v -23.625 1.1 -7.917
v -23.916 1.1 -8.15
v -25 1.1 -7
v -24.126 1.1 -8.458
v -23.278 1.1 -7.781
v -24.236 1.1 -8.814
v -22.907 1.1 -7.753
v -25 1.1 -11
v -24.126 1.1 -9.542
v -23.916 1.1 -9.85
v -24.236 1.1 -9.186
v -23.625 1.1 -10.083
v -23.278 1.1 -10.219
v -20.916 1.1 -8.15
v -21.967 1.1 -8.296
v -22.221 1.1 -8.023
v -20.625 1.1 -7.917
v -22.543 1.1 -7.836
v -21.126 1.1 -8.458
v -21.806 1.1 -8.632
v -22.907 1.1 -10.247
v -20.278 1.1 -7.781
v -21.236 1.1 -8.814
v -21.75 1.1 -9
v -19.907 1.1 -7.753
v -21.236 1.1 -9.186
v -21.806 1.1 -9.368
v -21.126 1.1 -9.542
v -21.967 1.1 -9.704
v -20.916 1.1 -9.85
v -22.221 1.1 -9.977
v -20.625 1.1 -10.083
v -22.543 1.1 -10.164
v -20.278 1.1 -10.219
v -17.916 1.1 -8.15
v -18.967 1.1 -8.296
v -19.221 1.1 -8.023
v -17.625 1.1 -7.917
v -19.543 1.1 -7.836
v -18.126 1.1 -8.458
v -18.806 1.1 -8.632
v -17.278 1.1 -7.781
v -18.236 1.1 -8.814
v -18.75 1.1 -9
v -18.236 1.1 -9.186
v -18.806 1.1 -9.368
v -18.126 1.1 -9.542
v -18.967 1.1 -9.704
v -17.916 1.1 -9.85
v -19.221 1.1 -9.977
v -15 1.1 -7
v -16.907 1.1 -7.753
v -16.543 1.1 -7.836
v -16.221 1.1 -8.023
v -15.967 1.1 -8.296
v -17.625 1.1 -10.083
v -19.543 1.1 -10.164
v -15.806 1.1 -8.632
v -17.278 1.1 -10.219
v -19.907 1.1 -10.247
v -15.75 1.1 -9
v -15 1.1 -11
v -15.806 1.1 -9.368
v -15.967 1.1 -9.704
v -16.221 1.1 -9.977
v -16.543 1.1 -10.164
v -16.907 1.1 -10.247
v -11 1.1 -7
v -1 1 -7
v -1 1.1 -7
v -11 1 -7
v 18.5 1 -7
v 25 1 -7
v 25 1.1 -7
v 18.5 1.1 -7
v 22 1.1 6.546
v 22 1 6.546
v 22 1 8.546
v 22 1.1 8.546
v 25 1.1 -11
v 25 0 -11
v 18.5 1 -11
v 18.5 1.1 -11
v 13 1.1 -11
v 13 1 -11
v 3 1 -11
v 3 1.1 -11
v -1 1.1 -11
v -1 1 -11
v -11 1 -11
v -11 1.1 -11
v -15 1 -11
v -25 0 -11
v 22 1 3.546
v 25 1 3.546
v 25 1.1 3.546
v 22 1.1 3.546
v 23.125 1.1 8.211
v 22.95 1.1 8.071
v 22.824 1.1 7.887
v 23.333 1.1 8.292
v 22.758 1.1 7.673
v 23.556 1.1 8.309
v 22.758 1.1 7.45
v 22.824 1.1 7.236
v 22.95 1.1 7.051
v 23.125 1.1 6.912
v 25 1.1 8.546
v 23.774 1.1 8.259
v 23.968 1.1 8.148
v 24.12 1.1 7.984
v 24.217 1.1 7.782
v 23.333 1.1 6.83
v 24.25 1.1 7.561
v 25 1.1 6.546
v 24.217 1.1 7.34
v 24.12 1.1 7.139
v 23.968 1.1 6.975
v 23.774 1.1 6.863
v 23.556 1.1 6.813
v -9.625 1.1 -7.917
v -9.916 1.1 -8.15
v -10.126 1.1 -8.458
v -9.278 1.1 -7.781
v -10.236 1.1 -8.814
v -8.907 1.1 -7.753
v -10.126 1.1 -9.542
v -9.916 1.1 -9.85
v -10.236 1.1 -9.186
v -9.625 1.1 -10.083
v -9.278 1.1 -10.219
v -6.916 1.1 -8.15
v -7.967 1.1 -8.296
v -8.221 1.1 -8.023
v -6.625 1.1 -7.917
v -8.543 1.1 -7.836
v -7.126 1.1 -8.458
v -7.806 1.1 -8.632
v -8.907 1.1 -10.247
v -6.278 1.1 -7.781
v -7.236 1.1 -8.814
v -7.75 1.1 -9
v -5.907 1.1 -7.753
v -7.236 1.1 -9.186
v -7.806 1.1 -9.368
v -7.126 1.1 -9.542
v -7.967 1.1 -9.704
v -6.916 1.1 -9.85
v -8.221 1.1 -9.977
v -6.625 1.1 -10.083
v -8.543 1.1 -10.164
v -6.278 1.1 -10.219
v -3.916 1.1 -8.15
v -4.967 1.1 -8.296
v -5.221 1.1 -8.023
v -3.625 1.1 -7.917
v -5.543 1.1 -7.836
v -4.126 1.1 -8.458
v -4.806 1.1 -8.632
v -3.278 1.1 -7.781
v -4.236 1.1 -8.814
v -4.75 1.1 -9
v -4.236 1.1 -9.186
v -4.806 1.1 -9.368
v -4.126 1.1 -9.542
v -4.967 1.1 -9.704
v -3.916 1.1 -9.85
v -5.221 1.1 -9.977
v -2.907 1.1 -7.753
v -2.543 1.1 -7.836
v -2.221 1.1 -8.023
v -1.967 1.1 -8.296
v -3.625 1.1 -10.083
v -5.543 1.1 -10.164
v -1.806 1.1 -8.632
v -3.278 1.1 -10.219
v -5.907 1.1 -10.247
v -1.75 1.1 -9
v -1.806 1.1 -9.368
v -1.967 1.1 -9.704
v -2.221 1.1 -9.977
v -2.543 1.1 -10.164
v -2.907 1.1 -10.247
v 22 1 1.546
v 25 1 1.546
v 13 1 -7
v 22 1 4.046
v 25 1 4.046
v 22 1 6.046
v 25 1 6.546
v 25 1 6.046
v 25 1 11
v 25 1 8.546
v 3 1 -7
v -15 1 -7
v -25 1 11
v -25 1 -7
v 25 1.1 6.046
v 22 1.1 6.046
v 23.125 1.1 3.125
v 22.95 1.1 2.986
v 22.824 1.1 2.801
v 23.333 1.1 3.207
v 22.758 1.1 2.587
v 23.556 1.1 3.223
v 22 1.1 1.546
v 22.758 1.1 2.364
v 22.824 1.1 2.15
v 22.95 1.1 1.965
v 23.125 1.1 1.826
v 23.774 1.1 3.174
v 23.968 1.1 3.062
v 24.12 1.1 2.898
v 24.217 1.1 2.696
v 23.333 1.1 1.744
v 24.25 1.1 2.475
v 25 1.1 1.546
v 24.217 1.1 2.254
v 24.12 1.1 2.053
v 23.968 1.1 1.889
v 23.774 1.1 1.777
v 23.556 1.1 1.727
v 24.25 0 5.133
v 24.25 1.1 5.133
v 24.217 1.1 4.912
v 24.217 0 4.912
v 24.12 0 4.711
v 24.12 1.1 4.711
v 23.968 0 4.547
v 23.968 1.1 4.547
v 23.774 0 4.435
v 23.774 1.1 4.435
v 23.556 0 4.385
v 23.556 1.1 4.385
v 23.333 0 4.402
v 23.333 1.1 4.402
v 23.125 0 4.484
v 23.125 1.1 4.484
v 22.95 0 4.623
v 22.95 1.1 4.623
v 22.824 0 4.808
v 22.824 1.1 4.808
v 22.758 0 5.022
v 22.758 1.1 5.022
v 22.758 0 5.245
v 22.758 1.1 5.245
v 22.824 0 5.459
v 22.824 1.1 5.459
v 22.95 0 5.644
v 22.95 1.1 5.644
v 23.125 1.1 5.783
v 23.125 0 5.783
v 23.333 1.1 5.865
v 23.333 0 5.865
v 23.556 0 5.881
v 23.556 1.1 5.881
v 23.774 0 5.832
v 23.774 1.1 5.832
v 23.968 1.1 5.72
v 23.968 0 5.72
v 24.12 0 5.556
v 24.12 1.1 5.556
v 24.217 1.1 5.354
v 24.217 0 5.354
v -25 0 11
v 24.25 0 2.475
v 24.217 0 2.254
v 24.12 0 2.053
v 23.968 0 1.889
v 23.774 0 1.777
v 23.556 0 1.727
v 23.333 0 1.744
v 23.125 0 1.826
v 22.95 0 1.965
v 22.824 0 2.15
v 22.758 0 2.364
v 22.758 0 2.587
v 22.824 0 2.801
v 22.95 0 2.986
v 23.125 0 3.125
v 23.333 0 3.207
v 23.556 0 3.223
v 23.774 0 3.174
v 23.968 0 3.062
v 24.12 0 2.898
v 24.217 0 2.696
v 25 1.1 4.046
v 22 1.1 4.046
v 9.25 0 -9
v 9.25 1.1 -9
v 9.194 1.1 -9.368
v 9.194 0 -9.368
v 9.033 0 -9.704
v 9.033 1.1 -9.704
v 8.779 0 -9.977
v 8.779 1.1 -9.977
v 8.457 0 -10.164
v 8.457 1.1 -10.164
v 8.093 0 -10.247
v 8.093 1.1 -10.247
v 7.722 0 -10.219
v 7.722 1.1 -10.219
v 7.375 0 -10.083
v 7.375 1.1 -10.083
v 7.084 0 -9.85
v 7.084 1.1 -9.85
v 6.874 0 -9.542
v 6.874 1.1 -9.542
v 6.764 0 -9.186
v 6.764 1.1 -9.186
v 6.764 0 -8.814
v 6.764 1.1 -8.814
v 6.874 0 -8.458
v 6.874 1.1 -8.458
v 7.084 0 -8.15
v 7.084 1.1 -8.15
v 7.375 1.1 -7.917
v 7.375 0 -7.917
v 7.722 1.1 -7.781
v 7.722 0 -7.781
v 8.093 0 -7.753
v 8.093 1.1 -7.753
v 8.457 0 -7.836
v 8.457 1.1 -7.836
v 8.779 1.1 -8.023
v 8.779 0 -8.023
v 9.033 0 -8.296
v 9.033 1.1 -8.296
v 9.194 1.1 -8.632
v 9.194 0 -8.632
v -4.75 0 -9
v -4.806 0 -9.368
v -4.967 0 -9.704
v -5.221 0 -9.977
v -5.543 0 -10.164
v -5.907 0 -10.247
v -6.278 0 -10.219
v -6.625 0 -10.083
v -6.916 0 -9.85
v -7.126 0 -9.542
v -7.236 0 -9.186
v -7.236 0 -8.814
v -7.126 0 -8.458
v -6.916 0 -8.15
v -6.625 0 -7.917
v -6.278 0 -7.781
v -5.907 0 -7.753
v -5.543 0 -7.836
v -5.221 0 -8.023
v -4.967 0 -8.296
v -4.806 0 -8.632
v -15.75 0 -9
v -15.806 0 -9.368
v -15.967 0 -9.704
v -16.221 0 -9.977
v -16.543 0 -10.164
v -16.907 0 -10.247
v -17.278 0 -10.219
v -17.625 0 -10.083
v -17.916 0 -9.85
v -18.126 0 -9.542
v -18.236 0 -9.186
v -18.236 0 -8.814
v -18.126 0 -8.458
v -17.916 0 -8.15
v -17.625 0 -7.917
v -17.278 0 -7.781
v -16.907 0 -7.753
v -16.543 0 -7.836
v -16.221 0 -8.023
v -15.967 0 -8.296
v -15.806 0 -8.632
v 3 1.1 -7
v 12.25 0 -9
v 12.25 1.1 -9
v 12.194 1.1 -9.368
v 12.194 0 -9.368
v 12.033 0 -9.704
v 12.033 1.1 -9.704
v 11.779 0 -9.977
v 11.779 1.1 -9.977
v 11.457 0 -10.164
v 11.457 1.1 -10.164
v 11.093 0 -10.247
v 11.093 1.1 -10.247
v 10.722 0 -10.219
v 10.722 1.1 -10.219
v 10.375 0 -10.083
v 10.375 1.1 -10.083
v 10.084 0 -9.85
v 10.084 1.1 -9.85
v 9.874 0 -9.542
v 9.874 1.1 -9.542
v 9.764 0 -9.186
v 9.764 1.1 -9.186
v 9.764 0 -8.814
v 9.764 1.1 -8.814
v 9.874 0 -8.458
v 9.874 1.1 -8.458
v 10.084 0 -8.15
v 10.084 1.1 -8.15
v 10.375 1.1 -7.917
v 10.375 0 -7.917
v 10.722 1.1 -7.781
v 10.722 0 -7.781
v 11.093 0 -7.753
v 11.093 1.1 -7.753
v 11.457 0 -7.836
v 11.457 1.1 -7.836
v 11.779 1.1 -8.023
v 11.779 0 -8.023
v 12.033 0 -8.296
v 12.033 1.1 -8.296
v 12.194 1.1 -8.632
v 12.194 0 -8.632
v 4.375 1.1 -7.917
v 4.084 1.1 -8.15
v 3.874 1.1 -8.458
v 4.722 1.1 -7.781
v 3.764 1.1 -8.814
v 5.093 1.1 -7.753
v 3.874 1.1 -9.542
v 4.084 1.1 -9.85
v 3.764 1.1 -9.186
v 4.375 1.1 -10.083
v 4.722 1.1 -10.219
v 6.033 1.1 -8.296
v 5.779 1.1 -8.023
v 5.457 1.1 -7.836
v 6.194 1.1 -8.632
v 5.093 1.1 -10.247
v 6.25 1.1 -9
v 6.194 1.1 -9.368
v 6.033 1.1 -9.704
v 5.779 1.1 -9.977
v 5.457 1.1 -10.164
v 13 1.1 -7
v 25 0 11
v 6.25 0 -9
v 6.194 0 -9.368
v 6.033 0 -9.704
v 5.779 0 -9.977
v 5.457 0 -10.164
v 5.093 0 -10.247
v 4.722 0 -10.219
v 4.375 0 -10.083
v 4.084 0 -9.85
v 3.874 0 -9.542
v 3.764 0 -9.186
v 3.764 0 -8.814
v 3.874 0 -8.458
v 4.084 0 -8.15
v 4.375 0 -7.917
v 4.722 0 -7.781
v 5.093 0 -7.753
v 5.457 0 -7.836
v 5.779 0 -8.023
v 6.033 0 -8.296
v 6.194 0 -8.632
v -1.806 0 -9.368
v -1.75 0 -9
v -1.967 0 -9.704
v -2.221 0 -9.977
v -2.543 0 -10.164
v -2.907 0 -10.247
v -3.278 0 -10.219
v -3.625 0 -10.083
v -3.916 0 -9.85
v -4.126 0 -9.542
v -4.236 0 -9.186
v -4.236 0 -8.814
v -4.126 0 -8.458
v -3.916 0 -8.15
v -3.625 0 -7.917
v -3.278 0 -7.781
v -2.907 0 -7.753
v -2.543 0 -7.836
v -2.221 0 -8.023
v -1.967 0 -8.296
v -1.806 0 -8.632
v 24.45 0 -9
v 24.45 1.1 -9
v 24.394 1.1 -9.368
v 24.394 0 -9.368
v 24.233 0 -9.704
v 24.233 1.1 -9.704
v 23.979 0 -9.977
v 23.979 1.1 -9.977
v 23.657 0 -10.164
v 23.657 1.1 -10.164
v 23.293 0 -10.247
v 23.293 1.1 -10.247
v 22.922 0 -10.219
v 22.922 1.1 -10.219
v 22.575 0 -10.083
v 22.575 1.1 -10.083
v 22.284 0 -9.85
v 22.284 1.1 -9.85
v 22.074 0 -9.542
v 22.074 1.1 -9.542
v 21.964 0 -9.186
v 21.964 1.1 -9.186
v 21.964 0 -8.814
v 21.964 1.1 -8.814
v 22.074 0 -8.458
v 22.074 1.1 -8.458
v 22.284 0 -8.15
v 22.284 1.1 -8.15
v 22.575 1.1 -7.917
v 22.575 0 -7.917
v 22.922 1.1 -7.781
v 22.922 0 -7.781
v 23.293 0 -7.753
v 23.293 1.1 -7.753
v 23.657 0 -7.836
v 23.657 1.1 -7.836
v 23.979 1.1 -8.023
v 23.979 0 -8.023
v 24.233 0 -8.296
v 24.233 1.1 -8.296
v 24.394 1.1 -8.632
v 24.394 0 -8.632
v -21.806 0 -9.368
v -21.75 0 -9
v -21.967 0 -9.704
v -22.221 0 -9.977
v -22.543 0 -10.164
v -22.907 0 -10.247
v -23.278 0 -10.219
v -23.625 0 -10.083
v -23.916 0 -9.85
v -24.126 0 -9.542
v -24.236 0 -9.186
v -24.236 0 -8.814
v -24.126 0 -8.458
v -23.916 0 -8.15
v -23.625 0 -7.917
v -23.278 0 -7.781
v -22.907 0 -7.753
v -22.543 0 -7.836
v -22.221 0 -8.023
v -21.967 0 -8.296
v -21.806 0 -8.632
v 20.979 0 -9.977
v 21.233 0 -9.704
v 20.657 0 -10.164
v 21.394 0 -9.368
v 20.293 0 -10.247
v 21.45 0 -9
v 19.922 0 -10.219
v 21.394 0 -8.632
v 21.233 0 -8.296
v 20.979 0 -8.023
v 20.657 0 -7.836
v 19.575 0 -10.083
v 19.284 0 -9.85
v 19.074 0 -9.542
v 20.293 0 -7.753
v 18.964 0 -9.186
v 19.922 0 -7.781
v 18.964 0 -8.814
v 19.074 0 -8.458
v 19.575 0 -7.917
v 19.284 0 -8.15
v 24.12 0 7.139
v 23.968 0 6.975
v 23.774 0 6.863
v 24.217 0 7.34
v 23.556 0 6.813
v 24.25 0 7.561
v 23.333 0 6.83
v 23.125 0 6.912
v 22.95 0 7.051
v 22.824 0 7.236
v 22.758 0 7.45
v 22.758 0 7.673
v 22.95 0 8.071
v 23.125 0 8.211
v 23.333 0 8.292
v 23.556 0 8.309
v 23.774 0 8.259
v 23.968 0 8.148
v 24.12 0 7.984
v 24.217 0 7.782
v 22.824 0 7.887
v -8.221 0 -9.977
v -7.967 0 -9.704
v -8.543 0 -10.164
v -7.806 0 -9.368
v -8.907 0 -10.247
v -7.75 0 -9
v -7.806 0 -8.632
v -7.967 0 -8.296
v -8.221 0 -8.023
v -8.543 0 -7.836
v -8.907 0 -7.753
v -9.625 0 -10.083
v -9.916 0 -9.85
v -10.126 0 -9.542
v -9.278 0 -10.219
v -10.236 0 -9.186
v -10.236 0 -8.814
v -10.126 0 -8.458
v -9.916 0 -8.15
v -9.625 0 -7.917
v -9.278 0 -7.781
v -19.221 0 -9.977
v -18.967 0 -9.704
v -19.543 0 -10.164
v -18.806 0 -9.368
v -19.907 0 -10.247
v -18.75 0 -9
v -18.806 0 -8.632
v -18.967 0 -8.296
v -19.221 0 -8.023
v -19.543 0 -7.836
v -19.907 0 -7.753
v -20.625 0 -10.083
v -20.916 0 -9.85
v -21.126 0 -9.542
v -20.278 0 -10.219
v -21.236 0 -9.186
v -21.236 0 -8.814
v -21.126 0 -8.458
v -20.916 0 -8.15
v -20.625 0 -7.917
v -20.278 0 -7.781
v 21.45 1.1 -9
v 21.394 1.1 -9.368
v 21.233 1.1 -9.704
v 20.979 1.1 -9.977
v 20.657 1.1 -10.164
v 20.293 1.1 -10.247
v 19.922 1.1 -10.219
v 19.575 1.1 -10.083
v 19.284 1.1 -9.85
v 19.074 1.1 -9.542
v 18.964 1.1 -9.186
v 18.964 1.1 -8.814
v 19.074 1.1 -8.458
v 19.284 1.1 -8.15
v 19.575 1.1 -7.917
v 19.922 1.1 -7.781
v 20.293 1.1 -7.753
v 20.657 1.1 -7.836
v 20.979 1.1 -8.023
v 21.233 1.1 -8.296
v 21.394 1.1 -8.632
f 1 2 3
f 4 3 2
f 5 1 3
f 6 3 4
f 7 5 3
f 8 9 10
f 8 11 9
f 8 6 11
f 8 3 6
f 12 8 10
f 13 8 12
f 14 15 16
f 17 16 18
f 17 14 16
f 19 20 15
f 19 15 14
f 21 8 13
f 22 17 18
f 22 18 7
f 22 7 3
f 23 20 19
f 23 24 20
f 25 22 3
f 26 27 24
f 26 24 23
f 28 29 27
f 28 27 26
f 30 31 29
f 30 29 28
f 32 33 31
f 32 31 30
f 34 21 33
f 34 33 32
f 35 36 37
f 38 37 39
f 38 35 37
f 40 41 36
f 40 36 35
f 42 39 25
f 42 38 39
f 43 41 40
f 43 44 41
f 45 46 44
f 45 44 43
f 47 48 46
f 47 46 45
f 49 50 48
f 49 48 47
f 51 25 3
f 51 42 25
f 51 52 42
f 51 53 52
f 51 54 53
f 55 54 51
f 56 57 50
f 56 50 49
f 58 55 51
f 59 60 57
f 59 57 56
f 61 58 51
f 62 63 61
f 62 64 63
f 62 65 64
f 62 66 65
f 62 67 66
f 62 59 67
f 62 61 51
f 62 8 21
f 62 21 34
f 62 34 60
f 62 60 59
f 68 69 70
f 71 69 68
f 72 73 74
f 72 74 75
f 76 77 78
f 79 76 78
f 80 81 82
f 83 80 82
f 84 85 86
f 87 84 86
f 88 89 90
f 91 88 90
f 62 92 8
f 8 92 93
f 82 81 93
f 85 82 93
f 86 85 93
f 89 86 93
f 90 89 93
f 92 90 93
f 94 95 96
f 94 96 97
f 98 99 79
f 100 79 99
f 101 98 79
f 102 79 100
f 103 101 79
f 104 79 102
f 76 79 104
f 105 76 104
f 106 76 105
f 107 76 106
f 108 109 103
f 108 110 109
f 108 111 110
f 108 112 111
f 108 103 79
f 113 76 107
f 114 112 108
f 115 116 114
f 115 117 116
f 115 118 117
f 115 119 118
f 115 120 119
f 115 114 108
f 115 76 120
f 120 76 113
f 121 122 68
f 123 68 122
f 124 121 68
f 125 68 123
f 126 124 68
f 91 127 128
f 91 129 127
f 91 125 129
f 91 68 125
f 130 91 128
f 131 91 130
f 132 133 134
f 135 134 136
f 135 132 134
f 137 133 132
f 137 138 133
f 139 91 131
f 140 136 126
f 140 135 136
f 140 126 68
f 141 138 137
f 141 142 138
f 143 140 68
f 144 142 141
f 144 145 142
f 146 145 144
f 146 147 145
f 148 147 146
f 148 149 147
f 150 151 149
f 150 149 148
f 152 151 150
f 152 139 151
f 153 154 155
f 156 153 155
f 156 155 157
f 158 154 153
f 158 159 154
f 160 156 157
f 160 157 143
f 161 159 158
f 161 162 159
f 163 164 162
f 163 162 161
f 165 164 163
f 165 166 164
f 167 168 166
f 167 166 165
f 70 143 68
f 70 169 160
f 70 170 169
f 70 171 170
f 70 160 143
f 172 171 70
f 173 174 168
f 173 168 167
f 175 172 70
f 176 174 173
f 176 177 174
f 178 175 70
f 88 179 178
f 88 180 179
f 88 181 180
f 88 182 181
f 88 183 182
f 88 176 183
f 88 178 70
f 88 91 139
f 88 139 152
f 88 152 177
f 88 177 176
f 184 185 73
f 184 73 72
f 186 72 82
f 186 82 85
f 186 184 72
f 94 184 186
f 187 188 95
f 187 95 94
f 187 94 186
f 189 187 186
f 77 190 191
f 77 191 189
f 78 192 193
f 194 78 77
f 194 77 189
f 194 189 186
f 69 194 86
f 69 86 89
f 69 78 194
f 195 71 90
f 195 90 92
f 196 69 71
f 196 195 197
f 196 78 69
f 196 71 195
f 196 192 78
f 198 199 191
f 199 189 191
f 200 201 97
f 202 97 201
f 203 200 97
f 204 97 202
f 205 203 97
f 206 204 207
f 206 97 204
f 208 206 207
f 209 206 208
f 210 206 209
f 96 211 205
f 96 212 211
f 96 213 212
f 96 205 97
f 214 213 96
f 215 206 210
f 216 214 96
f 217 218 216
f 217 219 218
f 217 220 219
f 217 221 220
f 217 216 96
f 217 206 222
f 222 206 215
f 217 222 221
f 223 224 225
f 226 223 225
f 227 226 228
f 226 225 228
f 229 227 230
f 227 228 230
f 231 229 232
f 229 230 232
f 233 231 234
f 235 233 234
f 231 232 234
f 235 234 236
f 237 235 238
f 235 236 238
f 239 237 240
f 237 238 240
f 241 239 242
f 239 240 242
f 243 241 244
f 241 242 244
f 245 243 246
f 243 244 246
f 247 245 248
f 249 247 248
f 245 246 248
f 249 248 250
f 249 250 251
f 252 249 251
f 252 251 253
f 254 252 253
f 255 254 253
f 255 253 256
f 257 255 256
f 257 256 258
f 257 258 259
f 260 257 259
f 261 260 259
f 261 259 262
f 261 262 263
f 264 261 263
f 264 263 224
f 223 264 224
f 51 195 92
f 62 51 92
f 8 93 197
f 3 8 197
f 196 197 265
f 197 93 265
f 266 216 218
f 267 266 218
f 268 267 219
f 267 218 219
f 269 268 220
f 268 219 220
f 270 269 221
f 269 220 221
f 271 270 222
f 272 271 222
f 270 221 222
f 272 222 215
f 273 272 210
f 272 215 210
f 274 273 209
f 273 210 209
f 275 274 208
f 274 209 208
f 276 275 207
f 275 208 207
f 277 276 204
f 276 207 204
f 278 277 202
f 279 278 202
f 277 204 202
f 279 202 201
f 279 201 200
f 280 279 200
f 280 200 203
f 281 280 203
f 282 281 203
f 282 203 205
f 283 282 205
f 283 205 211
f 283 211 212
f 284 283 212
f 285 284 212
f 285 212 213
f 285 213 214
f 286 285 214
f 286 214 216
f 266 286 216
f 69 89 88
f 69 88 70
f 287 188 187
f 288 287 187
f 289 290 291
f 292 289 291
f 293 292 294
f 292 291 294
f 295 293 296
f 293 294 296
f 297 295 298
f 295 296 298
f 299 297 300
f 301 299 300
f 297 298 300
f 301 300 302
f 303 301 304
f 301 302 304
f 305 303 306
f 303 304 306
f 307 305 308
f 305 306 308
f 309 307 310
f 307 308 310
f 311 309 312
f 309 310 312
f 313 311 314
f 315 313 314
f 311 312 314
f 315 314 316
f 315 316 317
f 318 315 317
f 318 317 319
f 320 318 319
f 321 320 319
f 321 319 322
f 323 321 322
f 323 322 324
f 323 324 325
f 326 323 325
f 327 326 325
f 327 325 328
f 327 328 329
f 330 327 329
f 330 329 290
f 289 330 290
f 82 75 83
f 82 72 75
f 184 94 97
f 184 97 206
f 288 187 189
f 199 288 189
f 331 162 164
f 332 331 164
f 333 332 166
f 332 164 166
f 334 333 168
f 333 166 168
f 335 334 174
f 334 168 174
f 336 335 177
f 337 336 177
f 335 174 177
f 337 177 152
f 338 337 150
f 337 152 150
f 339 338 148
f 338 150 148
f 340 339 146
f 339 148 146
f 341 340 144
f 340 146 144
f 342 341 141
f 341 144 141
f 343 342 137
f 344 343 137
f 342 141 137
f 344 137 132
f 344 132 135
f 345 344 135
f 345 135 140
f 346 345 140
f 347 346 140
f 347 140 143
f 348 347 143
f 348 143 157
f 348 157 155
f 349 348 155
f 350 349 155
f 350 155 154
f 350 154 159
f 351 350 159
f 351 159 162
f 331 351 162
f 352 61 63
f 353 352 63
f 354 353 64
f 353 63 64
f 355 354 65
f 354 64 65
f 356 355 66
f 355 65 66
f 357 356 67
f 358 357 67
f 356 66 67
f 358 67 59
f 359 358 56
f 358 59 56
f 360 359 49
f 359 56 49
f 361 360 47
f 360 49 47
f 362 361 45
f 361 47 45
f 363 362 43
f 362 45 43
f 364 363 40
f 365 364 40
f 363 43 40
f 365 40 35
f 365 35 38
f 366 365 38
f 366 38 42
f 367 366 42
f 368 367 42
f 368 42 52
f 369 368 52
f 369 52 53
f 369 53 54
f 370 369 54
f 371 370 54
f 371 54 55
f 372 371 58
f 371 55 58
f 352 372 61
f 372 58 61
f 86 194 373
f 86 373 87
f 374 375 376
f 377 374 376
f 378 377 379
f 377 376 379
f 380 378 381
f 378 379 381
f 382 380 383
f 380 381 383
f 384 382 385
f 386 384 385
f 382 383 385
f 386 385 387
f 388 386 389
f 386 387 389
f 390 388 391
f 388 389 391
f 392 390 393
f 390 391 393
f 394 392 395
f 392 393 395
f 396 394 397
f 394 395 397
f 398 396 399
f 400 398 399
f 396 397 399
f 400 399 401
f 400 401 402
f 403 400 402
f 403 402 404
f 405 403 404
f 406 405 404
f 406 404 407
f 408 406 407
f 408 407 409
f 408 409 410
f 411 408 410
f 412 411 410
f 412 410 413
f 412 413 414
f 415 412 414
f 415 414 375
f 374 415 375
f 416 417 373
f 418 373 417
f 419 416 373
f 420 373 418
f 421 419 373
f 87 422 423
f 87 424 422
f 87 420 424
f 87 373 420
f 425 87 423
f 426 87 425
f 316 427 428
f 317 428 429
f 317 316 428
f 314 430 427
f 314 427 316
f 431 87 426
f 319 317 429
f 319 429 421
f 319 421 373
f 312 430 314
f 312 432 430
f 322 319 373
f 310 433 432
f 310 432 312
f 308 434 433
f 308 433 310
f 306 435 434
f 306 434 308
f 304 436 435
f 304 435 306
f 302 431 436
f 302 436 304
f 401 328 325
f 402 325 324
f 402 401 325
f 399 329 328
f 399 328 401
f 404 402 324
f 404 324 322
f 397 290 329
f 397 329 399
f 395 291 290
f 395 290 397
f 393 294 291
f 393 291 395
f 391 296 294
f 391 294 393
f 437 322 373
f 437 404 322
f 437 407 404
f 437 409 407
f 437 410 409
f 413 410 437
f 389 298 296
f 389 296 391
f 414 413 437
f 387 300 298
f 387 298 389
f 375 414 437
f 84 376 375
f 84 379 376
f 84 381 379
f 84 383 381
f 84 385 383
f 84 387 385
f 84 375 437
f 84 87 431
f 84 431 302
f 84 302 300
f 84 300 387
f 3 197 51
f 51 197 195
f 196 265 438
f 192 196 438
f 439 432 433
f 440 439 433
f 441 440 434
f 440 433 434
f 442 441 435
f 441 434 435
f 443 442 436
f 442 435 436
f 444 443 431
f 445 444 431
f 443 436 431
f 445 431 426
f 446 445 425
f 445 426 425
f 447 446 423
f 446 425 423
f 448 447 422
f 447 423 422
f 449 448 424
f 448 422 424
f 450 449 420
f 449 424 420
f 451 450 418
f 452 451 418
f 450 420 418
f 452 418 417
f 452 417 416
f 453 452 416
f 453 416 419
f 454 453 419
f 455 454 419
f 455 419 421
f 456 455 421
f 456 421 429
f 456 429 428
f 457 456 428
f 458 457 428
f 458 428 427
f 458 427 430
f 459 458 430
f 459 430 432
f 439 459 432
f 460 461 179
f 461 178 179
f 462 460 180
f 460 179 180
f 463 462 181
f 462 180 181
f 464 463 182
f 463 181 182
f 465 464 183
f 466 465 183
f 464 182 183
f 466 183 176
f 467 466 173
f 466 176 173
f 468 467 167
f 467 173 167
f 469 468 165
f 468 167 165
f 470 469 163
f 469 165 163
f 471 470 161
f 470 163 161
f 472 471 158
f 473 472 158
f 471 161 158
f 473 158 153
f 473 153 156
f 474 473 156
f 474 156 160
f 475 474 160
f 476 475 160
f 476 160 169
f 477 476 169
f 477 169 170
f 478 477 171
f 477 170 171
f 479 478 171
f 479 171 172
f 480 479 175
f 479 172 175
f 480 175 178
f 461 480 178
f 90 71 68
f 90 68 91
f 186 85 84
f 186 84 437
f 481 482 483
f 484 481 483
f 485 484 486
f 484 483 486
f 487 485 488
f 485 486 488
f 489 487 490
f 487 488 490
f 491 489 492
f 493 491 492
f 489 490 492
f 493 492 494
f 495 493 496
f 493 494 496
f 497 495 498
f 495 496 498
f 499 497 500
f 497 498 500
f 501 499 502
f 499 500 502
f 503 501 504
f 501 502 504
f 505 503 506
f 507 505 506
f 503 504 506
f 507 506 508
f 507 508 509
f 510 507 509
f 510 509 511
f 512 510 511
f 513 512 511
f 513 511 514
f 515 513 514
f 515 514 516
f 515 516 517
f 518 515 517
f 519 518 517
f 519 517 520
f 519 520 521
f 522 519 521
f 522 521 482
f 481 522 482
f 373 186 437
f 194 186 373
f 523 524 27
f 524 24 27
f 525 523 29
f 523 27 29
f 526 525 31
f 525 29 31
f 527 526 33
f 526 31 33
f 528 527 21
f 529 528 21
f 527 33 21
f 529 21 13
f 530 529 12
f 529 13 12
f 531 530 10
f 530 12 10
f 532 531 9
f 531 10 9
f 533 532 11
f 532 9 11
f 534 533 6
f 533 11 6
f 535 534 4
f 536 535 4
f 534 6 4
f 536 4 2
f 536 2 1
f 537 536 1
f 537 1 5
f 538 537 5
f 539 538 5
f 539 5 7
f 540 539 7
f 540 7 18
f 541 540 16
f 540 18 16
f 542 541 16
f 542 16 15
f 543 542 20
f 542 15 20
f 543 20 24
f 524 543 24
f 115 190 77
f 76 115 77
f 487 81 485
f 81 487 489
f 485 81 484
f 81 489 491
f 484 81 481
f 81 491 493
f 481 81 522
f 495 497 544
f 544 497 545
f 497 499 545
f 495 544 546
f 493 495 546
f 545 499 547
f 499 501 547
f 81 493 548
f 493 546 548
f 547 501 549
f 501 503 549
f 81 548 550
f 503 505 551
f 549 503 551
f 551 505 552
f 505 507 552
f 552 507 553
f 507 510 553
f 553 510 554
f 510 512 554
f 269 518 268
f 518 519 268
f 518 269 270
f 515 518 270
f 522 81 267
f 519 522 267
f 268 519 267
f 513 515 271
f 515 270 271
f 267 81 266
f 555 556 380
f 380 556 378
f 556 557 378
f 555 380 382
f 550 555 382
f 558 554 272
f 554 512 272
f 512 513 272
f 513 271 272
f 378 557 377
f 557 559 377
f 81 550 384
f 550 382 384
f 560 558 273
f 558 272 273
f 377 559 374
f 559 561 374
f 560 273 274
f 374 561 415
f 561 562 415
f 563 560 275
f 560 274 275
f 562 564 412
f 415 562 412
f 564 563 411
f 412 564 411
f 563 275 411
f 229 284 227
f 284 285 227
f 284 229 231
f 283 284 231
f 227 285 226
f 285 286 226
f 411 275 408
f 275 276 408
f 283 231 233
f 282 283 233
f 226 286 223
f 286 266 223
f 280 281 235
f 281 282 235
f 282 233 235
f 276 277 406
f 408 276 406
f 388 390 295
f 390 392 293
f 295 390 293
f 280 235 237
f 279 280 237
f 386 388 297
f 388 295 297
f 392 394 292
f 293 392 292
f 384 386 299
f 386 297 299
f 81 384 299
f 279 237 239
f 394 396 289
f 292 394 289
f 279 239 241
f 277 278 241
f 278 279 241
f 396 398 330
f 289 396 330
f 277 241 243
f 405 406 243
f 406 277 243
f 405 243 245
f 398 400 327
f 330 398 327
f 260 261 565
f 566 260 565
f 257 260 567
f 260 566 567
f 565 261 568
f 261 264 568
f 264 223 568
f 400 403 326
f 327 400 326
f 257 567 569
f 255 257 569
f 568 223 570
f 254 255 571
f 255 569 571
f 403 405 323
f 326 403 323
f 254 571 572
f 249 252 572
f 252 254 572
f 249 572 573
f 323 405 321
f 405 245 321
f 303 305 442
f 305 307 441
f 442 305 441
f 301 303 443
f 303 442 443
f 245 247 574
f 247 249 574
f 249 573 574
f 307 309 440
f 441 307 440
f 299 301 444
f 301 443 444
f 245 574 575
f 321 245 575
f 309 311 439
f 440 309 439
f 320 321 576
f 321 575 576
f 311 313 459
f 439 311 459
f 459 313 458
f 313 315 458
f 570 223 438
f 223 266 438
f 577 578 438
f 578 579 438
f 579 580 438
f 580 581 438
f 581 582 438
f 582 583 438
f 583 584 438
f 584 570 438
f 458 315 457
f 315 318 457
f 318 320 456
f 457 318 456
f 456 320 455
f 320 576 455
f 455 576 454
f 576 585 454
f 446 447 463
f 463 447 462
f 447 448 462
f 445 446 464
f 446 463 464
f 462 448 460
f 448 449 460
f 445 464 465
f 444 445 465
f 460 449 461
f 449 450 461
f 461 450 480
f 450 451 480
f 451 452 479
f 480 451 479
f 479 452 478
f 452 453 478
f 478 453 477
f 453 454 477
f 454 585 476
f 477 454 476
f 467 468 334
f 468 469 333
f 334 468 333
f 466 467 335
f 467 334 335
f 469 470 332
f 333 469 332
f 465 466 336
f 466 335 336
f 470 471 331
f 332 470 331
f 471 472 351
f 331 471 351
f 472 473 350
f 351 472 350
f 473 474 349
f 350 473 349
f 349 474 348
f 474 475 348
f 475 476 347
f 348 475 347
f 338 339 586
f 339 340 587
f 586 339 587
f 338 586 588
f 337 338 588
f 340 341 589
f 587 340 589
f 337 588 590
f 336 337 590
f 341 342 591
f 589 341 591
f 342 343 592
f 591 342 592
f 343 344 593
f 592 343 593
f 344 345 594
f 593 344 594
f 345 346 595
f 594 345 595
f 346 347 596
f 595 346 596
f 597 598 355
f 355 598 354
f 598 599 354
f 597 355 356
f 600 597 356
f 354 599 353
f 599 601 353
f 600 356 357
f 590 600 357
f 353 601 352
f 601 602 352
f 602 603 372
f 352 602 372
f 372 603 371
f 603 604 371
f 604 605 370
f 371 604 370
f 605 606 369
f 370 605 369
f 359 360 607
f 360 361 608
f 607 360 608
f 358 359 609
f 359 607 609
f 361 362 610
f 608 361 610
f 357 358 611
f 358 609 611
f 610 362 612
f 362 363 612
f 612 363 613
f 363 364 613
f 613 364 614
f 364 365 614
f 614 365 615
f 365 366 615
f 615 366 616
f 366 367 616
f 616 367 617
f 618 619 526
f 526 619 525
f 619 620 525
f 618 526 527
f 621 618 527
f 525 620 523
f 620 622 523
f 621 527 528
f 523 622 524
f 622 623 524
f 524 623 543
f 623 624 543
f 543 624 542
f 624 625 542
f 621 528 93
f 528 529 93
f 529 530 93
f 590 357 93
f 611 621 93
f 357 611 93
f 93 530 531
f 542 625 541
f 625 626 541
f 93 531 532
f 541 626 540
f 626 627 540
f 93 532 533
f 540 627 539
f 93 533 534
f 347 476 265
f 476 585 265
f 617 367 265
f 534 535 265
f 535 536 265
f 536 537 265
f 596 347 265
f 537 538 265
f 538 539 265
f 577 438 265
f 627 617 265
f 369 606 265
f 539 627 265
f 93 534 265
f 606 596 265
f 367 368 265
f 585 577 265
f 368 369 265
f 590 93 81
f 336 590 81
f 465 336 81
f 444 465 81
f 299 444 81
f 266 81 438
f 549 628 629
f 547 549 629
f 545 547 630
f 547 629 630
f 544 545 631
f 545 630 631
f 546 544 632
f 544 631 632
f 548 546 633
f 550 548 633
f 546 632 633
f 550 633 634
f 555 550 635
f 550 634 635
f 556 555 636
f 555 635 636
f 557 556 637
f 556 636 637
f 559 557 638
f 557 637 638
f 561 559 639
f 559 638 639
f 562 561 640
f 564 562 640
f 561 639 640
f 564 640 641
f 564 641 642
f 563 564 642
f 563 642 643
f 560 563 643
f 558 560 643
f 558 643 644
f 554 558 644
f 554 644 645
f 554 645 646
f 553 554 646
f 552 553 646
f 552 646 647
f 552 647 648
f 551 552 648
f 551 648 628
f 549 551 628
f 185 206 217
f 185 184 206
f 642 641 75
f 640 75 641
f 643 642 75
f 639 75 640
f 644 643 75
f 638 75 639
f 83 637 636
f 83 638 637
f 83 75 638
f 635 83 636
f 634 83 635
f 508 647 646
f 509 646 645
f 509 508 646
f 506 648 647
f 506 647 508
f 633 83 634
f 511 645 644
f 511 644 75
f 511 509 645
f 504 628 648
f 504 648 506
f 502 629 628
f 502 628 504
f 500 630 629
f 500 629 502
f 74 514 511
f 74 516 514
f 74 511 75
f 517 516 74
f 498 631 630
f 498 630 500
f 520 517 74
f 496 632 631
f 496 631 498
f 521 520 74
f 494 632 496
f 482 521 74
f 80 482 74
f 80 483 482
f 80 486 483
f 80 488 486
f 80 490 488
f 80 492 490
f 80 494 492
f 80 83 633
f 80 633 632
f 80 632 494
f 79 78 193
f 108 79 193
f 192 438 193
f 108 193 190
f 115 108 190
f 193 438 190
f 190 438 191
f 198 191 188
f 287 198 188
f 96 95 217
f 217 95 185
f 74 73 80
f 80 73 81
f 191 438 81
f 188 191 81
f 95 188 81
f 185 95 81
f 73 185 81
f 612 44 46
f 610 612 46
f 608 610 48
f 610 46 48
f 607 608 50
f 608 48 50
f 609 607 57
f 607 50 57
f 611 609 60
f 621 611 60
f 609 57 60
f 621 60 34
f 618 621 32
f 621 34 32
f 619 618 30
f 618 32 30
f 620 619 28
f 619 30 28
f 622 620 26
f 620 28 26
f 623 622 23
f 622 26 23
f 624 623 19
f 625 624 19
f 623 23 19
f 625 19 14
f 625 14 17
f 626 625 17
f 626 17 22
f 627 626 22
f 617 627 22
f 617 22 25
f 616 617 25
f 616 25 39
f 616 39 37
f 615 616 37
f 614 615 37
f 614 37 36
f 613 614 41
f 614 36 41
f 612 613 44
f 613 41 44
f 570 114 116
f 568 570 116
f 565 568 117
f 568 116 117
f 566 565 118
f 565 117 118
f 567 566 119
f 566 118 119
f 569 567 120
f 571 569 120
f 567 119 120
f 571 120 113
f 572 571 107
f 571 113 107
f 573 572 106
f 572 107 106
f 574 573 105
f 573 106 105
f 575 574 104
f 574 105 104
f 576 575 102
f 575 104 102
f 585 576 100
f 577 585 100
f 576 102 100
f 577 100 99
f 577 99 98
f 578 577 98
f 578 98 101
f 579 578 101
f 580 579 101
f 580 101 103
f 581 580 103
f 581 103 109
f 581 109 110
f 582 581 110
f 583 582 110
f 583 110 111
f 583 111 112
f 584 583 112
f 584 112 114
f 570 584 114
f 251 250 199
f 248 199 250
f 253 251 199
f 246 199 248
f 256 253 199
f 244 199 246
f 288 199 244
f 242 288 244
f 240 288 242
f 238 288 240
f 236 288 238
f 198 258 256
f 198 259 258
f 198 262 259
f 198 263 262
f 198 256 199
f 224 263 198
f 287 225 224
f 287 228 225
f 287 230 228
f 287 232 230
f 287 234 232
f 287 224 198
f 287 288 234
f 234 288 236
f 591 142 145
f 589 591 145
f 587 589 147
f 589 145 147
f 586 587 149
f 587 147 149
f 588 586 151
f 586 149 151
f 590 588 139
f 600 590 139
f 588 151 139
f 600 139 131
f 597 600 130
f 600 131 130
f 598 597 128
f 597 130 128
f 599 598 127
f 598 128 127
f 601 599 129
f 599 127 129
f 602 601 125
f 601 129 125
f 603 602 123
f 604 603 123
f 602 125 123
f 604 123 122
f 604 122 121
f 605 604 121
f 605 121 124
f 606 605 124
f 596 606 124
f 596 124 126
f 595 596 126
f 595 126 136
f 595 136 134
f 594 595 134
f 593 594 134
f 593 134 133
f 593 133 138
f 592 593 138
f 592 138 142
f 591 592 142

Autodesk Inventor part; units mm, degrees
ref_plane "YZ Plane" through (0, 0, 0) normal (1, 0, 0) x (0, 1, 0)
ref_plane "XZ Plane" through (0, 0, 0) normal (0, 1, 0) x (-1, 0, 0)
ref_plane "XY Plane" through (0, 0, 0) normal (0, 0, 1) x (1, 0, 0)
sketch "Boceto1" plane through (0, 0, 0) normal (0, 1, 0) x (-1, 0, 0)
  line L0 (25, 11) -> (-25, 11)
  line L1 (-25, 11) -> (-25, -11)
  line L2 (-25, -11) -> (25, -11)
  line L3 (25, -11) -> (25, 11)
  point P0 (0, 0)
  dimension "largo" = 50
  dimension "ancho" = 22
  dimension "d2" = 11
  dimension "d3" = 25
extrude "Extrusión1" add sketch "Boceto1" along normal blind 1
sketch "Boceto2" plane through (0, 1, 0) normal (0, 1, 0) x (1, 0, 0)
  line L0 (-25, 11) -> (-25, -11) projected
  line L1 (-25, 7) -> (-15, 7)
  line L2 (-15, 7) -> (-15, 11)
  line L3 (-15, 11) -> (-25, 11)
  line L4 (-25, 11) -> (-25, 7)
  line L5 (-11, 11) -> (-1, 11)
  line L6 (-1, 11) -> (-1, 7)
  line L7 (-1, 7) -> (-11, 7)
  line L8 (-11, 7) -> (-11, 11)
  line L9 (25, 11) -> (-25, 11) projected
  line L10 (3, 11) -> (13, 11)
  line L11 (13, 11) -> (13, 7)
  line L12 (13, 7) -> (3, 7)
  line L13 (3, 7) -> (3, 11)
  line L14 (18.5, 11) -> (25, 11)
  line L15 (25, 11) -> (25, 7)
  line L16 (25, 7) -> (18.5, 7)
  line L17 (18.5, 7) -> (18.5, 11)
  line L18 (25, -11) -> (25, 11) projected
  line L19 (25, -3.5465) -> (22, -3.5465)
  line L20 (22, -3.5465) -> (22, -1.5465)
  line L21 (22, -1.5465) -> (25, -1.5465)
  line L22 (25, -1.5465) -> (25, -3.5465)
  line L23 (25, -4.0465) -> (22, -4.0465)
  line L24 (22, -4.0465) -> (22, -6.0465)
  line L25 (22, -6.0465) -> (25, -6.0465)
  line L26 (25, -6.0465) -> (25, -4.0465)
  line L27 (25, -6.5465) -> (22, -6.5465)
  line L28 (22, -6.5465) -> (22, -8.5465)
  line L29 (22, -8.5465) -> (25, -8.5465)
  line L30 (25, -8.5465) -> (25, -6.5465)
  point P0 (0, 0)
  point P1 (25, -1.5465)
  point P2 (25, 11)
  point P3 (13, 11)
  dimension "d6" = 10
  dimension "d7" = 4
  dimension "d8" = 10
  dimension "d9" = 4
  dimension "d10" = 10
  dimension "d11" = 4
  dimension "d12" = 6.5
  dimension "d13" = 4
  dimension "d14" = 3
  dimension "d15" = 2
  dimension "d22" = 0
  dimension "d23" = 0
  dimension "d24" = 14
  dimension "d25" = 14
  dimension "d27" = 0
  dimension "d28" = 2
  dimension "d29" = 3
  dimension "d30" = 2
  dimension "d31" = 0.5
  dimension "d32" = 0.5
extrude "Extrusión2" add sketch "Boceto2" along normal blind 0.1
sketch "Boceto3" plane through (0, 1.1, 0) normal (0, 1, 0) x (1, 0, 0)
  circle A0 centre (-23, 9) radius 1.25
  circle A1 centre (-20, 9) radius 1.25
  circle A2 centre (-17, 9) radius 1.25
  line L0 (-15, 11) -> (-25, 11) projected
  line L1 (-25, 11) -> (-25, 7) projected
  line L2 (-25, 7) -> (-15, 7) projected
  circle A3 centre (-9, 9) radius 1.25
  circle A4 centre (-6, 9) radius 1.25
  circle A5 centre (-3, 9) radius 1.25
  line L3 (-11, 11) -> (-11, 7) projected
  circle A6 centre (5, 9) radius 1.25
  circle A7 centre (8, 9) radius 1.25
  circle A8 centre (11, 9) radius 1.25
  circle A9 centre (20.2, 9) radius 1.25
  circle A10 centre (23.2, 9) radius 1.25
  line L4 (18.5, 11) -> (18.5, 7) projected
  line L5 (3, 11) -> (3, 7) projected
  circle A11 centre (23.5, -7.5613) radius 0.75
  circle A12 centre (23.5, -5.1334) radius 0.75
  circle A13 centre (23.5, -2.4754) radius 0.75
  line L6 (22, -6.5465) -> (22, -8.5465) projected
  point P0 (0, 0)
  dimension "d33" = 2.5
  dimension "d34" = 2.5
  dimension "d35" = 2.5
  dimension "d36" = 2
  dimension "d37" = 2
  dimension "d38" = 3
  dimension "d39" = 2
  dimension "d40" = 3
  dimension "d41" = 2
  dimension "d42" = 2.5
  dimension "d43" = 2.5
  dimension "d44" = 2.5
  dimension "d45" = 3
  dimension "d46" = 3
  dimension "d47" = 2
  dimension "d48" = 2.5
  dimension "d49" = 2.5
  dimension "d50" = 2.5
  dimension "d51" = 3
  dimension "d52" = 3
  dimension "d53" = 2.5
  dimension "d54" = 2.5
  dimension "d56" = 3
  dimension "d58" = 1.7
  dimension "d59" = 2
  dimension "d60" = 1.5
  dimension "d61" = 1.5
  dimension "d62" = 1.5
  dimension "d63" = 1.5
extrude "Extrusión3" cut sketch "Boceto3" against normal blind 5.1
sketch "Boceto4" plane through (0, 1.1, 0) normal (0, 1, 0) x (1, 0, 0)
  circle A0 centre (-20, 9) radius 1.25 projected
sketch "Boceto5" plane through (0, 1.1, 0) normal (0, 1, 0) x (1, 0, 0)
  circle A0 centre (-6, 9) radius 1.25 projected
sketch "Boceto6" plane through (0, 1.1, 0) normal (0, 1, 0) x (1, 0, 0)
  circle A0 centre (8, 9) radius 1.25 projected
sketch "Boceto7" plane through (0, 1.1, 0) normal (0, 1, 0) x (1, 0, 0)
  circle A0 centre (20.2, 9) radius 1.25 projected
sketch "Boceto8" plane through (0, 1.1, 0) normal (0, 1, 0) x (1, 0, 0)
  circle A0 centre (23.5, -2.4754) radius 0.75 projected
sketch "Boceto9" plane through (0, 1.1, 0) normal (0, 1, 0) x (1, 0, 0)
  circle A0 centre (23.5, -5.1334) radius 0.75 projected
sketch "Boceto10" plane through (0, 1.1, 0) normal (0, 1, 0) x (1, 0, 0)
  circle A0 centre (23.5, -7.5613) radius 0.75 projected
equation "\"d2\" = 0.5 * ancho"
equation "\"d3\" = 0.5 * largo"
properties part number "CARGADOR BATERIA LIPO LITIO 4 CELDAS 5A 18650"
